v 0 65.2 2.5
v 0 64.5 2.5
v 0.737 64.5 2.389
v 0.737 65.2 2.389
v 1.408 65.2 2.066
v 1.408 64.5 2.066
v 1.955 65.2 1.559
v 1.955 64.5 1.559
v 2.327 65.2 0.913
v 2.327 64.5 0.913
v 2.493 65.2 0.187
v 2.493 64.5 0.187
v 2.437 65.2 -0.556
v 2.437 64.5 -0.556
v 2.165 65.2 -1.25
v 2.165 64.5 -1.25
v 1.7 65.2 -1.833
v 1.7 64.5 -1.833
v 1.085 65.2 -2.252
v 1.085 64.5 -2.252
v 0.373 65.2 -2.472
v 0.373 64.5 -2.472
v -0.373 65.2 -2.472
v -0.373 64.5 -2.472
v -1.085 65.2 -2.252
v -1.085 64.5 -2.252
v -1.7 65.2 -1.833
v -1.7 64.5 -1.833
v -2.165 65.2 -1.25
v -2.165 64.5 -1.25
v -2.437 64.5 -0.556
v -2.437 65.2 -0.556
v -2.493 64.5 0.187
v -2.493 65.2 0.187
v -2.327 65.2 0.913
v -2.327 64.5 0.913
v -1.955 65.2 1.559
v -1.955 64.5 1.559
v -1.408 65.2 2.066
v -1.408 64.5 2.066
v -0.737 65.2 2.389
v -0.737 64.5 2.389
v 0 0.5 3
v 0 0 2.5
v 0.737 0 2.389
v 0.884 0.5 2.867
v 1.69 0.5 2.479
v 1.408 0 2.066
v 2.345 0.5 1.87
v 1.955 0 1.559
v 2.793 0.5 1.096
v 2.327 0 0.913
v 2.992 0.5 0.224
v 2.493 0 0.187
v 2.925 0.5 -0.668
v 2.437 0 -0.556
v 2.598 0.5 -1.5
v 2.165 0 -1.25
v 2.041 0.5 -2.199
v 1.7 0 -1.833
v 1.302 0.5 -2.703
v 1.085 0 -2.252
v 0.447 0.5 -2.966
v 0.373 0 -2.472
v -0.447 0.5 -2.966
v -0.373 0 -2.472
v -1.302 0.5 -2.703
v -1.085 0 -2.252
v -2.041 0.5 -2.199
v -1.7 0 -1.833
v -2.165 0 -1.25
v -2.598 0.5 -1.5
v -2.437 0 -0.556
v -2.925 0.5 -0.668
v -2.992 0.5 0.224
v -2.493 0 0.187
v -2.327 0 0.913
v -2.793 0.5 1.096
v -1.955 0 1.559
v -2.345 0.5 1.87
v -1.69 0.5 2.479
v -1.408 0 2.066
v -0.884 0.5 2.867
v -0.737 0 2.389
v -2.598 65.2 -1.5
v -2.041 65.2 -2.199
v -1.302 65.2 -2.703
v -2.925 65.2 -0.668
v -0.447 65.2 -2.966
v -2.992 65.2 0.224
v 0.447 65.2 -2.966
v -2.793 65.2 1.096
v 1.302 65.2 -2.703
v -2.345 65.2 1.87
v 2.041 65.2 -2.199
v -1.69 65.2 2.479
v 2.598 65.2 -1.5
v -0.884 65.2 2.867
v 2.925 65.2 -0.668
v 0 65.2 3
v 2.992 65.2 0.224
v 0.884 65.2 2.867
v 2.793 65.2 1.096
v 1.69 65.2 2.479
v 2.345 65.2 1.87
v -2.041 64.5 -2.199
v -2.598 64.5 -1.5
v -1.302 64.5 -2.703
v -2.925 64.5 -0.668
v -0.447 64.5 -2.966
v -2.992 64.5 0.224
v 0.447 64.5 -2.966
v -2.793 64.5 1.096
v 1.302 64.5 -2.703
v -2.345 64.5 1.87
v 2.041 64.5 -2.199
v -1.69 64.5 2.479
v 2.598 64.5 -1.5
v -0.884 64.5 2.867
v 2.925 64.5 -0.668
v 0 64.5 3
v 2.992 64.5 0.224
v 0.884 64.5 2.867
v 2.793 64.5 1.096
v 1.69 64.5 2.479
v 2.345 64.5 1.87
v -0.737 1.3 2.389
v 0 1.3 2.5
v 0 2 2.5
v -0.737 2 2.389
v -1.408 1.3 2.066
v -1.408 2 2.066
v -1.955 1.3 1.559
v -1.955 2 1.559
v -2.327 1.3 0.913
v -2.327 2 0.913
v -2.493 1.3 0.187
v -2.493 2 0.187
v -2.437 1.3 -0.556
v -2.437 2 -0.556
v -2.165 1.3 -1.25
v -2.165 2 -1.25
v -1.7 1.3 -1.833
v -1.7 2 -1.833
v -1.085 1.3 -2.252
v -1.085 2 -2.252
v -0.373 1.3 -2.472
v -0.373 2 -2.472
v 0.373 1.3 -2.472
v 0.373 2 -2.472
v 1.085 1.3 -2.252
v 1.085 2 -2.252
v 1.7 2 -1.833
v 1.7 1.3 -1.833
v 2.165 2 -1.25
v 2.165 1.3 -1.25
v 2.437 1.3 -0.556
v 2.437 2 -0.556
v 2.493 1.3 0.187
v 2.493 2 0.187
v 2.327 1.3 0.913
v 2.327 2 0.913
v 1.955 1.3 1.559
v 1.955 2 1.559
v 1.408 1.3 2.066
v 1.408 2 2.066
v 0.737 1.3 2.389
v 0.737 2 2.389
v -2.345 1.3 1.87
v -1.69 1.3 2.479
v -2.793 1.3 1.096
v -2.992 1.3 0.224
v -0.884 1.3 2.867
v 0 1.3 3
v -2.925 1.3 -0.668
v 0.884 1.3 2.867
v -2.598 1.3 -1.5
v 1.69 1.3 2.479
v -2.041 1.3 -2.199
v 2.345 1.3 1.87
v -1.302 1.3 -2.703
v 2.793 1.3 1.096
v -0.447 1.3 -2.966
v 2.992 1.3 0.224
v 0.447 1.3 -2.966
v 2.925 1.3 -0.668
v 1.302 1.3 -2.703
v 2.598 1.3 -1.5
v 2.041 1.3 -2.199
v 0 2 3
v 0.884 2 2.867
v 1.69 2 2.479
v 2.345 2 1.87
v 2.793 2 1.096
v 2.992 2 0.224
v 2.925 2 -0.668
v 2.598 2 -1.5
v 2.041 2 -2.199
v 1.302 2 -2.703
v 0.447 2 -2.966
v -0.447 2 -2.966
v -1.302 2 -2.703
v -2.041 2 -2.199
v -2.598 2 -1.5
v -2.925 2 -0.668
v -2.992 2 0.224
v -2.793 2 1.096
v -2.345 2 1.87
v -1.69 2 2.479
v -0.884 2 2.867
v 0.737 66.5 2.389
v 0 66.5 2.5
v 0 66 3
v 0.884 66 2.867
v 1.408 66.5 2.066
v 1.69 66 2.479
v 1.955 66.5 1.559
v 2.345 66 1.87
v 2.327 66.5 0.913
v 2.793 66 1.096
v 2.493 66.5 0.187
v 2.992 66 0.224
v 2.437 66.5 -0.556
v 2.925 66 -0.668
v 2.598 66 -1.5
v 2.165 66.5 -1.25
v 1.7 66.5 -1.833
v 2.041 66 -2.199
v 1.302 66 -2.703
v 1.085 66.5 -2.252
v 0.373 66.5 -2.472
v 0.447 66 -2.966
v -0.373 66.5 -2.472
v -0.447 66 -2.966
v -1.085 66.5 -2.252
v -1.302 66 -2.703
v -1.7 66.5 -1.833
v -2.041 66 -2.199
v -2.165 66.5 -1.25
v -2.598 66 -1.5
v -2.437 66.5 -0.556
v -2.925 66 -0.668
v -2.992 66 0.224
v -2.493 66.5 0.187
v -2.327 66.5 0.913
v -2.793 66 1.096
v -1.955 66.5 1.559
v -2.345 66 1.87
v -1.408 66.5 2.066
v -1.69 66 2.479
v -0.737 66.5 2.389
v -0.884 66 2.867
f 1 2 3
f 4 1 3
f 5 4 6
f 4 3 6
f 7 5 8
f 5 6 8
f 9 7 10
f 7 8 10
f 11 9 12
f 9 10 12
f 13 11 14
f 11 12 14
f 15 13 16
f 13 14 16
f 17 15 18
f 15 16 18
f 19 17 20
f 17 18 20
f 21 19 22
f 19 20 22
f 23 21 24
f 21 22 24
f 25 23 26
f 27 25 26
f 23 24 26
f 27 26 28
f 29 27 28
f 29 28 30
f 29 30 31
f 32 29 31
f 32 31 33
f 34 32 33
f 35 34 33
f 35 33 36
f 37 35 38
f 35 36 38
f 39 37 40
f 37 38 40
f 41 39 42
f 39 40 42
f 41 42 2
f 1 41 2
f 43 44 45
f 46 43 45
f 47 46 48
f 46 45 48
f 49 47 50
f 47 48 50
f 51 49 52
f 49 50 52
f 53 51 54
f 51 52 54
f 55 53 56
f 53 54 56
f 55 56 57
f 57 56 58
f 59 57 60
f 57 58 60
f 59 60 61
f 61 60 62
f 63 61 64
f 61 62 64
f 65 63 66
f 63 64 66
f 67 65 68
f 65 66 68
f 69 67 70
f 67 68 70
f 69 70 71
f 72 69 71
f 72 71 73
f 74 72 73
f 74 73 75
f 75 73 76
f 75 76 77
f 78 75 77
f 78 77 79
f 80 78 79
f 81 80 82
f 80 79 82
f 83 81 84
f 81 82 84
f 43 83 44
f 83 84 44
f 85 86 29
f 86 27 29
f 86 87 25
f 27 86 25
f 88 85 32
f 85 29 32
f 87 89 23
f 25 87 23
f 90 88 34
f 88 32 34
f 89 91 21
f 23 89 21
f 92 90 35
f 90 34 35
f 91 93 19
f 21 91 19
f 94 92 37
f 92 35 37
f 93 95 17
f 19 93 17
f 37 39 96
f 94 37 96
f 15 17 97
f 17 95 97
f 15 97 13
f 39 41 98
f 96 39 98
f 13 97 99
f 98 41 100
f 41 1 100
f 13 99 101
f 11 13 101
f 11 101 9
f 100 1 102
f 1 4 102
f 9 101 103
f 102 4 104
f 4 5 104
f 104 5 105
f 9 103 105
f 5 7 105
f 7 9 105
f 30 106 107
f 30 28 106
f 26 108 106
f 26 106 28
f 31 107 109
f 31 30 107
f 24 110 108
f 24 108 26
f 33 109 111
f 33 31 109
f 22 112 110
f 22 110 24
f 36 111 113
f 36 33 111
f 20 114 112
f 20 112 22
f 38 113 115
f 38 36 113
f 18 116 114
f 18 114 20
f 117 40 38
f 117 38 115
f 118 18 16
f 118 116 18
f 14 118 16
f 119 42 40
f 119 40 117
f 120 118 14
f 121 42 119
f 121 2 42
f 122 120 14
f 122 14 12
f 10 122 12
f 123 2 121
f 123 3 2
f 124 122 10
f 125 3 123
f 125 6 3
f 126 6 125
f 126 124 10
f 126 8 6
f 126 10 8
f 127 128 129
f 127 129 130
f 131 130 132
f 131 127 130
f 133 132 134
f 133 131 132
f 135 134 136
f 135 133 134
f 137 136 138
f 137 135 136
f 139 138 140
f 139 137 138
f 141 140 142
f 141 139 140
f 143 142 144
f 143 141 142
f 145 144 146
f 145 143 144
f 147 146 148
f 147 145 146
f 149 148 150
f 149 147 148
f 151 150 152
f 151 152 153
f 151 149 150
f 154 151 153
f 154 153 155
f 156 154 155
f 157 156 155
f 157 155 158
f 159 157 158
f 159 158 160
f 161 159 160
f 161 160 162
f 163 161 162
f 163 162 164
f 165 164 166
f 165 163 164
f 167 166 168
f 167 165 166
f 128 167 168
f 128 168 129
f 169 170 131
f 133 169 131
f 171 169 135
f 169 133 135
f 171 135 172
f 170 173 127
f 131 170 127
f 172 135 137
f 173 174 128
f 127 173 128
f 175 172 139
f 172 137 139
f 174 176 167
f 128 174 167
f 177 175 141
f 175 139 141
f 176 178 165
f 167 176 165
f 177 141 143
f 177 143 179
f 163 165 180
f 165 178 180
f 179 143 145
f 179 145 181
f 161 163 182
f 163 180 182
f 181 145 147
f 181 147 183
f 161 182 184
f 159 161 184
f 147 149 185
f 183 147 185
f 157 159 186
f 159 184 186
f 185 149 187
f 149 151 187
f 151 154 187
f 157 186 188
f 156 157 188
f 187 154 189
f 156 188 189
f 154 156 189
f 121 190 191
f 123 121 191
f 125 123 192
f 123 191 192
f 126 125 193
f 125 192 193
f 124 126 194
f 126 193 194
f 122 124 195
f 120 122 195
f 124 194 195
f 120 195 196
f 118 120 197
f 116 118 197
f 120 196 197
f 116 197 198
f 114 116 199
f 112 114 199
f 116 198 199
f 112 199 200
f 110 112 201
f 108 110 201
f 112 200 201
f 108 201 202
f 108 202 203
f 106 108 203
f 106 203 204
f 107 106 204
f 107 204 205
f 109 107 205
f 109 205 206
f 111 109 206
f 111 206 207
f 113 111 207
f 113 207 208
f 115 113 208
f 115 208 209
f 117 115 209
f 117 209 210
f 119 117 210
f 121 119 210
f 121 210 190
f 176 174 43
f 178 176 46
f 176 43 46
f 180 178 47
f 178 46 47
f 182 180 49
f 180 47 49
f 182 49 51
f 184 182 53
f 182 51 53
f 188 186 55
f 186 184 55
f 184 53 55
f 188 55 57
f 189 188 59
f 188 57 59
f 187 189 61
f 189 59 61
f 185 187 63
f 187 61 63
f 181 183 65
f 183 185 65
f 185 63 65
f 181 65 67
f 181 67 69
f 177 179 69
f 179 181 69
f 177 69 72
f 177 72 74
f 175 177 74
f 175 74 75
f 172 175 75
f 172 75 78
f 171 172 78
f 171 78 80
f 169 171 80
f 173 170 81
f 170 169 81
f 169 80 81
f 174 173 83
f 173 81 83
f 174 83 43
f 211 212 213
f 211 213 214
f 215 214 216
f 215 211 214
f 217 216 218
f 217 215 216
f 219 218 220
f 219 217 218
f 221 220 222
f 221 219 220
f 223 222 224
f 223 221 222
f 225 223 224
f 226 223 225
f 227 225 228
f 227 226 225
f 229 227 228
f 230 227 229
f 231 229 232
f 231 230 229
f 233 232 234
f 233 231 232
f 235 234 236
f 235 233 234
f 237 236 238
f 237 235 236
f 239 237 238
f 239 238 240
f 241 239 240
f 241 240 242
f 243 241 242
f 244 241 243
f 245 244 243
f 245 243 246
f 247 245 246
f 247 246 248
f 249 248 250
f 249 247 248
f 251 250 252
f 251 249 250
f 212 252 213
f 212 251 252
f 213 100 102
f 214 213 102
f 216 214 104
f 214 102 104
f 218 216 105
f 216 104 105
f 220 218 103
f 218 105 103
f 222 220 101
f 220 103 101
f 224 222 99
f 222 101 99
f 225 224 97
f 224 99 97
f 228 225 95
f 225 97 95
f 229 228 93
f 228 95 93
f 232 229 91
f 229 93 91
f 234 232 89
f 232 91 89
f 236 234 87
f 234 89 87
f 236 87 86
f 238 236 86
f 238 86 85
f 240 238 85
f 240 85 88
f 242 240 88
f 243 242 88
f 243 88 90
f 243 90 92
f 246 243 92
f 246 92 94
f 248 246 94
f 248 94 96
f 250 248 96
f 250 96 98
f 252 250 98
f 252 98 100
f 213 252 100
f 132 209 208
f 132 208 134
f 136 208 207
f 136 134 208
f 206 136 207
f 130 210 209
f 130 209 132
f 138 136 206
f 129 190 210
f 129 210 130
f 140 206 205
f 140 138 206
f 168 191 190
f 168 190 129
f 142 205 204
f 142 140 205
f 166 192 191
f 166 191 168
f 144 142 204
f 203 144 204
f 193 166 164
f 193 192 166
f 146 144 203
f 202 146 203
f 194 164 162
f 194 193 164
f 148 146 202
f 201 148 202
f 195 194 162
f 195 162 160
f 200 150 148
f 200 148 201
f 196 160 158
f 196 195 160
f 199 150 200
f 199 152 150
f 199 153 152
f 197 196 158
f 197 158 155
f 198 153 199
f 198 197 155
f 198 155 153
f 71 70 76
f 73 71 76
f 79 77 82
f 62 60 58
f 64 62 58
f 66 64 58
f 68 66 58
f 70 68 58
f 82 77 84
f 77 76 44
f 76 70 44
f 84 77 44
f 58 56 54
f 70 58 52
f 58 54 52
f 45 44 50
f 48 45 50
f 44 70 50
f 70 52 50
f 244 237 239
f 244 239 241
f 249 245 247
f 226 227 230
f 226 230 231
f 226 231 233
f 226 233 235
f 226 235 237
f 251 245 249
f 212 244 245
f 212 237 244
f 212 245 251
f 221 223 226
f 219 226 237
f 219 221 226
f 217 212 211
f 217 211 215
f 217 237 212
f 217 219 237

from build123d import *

# Parameters (mm, degrees)
SKETCH1_R          = 3
EXTRUDE_50_DEPTH   = 66.5
CUT_EXTRUDE1_START = -2
SKETCH2_R          = 3
SKETCH2_R_2        = 2.5
CUT_EXTRUDE1_DEPTH = 0.7
CUT_EXTRUDE2_START = -1.3
SKETCH3_R          = 3
SKETCH3_R_2        = 2.5
CUT_EXTRUDE2_DEPTH = 0.7
CHAMFER1_SIZE      = 0.5


with BuildPart() as part:
    # Sketch1 → Extrude 50 (new body)
    with BuildSketch(Plane(origin=(0, 0, 0), x_dir=(1, 0, 0), z_dir=(0, 1, 0))):
        with Locations(Location((0, 0, 0), (0, 0, 270))):
            Circle(SKETCH1_R)
    extrude(amount=EXTRUDE_50_DEPTH)

    # Sketch2 → Cut-Extrude1 (cut)
    with BuildSketch(Plane(origin=(0, 66.5, 0), x_dir=(1, 0, 0), z_dir=(0, 1, 0)).offset(CUT_EXTRUDE1_START)):
        with Locations(Location((0, 0, 0), (0, 0, 270))):
            Circle(SKETCH2_R)
        with Locations(Location((0, 0, 0), (0, 0, 270))):
            Circle(SKETCH2_R_2, mode=Mode.SUBTRACT)
    extrude(amount=CUT_EXTRUDE1_DEPTH, mode=Mode.SUBTRACT)

    # Sketch3 → Cut-Extrude2 (cut)
    with BuildSketch(Plane.XZ.offset(CUT_EXTRUDE2_START)):
        with Locations(Location((0, 0, 0), (0, 0, 270))):
            Circle(SKETCH3_R)
        with Locations(Location((0, 0, 0), (0, 0, 90))):
            Circle(SKETCH3_R_2, mode=Mode.SUBTRACT)
    extrude(amount=-CUT_EXTRUDE2_DEPTH, mode=Mode.SUBTRACT)

    # Chamfer1
    chamfer1_edges = [part.edges().sort_by_distance(p)[0] for p in [
        (0, 0, -3),
        (0, 66.5, -3),
    ]]
    chamfer(chamfer1_edges, length=CHAMFER1_SIZE)


solid = part.part
